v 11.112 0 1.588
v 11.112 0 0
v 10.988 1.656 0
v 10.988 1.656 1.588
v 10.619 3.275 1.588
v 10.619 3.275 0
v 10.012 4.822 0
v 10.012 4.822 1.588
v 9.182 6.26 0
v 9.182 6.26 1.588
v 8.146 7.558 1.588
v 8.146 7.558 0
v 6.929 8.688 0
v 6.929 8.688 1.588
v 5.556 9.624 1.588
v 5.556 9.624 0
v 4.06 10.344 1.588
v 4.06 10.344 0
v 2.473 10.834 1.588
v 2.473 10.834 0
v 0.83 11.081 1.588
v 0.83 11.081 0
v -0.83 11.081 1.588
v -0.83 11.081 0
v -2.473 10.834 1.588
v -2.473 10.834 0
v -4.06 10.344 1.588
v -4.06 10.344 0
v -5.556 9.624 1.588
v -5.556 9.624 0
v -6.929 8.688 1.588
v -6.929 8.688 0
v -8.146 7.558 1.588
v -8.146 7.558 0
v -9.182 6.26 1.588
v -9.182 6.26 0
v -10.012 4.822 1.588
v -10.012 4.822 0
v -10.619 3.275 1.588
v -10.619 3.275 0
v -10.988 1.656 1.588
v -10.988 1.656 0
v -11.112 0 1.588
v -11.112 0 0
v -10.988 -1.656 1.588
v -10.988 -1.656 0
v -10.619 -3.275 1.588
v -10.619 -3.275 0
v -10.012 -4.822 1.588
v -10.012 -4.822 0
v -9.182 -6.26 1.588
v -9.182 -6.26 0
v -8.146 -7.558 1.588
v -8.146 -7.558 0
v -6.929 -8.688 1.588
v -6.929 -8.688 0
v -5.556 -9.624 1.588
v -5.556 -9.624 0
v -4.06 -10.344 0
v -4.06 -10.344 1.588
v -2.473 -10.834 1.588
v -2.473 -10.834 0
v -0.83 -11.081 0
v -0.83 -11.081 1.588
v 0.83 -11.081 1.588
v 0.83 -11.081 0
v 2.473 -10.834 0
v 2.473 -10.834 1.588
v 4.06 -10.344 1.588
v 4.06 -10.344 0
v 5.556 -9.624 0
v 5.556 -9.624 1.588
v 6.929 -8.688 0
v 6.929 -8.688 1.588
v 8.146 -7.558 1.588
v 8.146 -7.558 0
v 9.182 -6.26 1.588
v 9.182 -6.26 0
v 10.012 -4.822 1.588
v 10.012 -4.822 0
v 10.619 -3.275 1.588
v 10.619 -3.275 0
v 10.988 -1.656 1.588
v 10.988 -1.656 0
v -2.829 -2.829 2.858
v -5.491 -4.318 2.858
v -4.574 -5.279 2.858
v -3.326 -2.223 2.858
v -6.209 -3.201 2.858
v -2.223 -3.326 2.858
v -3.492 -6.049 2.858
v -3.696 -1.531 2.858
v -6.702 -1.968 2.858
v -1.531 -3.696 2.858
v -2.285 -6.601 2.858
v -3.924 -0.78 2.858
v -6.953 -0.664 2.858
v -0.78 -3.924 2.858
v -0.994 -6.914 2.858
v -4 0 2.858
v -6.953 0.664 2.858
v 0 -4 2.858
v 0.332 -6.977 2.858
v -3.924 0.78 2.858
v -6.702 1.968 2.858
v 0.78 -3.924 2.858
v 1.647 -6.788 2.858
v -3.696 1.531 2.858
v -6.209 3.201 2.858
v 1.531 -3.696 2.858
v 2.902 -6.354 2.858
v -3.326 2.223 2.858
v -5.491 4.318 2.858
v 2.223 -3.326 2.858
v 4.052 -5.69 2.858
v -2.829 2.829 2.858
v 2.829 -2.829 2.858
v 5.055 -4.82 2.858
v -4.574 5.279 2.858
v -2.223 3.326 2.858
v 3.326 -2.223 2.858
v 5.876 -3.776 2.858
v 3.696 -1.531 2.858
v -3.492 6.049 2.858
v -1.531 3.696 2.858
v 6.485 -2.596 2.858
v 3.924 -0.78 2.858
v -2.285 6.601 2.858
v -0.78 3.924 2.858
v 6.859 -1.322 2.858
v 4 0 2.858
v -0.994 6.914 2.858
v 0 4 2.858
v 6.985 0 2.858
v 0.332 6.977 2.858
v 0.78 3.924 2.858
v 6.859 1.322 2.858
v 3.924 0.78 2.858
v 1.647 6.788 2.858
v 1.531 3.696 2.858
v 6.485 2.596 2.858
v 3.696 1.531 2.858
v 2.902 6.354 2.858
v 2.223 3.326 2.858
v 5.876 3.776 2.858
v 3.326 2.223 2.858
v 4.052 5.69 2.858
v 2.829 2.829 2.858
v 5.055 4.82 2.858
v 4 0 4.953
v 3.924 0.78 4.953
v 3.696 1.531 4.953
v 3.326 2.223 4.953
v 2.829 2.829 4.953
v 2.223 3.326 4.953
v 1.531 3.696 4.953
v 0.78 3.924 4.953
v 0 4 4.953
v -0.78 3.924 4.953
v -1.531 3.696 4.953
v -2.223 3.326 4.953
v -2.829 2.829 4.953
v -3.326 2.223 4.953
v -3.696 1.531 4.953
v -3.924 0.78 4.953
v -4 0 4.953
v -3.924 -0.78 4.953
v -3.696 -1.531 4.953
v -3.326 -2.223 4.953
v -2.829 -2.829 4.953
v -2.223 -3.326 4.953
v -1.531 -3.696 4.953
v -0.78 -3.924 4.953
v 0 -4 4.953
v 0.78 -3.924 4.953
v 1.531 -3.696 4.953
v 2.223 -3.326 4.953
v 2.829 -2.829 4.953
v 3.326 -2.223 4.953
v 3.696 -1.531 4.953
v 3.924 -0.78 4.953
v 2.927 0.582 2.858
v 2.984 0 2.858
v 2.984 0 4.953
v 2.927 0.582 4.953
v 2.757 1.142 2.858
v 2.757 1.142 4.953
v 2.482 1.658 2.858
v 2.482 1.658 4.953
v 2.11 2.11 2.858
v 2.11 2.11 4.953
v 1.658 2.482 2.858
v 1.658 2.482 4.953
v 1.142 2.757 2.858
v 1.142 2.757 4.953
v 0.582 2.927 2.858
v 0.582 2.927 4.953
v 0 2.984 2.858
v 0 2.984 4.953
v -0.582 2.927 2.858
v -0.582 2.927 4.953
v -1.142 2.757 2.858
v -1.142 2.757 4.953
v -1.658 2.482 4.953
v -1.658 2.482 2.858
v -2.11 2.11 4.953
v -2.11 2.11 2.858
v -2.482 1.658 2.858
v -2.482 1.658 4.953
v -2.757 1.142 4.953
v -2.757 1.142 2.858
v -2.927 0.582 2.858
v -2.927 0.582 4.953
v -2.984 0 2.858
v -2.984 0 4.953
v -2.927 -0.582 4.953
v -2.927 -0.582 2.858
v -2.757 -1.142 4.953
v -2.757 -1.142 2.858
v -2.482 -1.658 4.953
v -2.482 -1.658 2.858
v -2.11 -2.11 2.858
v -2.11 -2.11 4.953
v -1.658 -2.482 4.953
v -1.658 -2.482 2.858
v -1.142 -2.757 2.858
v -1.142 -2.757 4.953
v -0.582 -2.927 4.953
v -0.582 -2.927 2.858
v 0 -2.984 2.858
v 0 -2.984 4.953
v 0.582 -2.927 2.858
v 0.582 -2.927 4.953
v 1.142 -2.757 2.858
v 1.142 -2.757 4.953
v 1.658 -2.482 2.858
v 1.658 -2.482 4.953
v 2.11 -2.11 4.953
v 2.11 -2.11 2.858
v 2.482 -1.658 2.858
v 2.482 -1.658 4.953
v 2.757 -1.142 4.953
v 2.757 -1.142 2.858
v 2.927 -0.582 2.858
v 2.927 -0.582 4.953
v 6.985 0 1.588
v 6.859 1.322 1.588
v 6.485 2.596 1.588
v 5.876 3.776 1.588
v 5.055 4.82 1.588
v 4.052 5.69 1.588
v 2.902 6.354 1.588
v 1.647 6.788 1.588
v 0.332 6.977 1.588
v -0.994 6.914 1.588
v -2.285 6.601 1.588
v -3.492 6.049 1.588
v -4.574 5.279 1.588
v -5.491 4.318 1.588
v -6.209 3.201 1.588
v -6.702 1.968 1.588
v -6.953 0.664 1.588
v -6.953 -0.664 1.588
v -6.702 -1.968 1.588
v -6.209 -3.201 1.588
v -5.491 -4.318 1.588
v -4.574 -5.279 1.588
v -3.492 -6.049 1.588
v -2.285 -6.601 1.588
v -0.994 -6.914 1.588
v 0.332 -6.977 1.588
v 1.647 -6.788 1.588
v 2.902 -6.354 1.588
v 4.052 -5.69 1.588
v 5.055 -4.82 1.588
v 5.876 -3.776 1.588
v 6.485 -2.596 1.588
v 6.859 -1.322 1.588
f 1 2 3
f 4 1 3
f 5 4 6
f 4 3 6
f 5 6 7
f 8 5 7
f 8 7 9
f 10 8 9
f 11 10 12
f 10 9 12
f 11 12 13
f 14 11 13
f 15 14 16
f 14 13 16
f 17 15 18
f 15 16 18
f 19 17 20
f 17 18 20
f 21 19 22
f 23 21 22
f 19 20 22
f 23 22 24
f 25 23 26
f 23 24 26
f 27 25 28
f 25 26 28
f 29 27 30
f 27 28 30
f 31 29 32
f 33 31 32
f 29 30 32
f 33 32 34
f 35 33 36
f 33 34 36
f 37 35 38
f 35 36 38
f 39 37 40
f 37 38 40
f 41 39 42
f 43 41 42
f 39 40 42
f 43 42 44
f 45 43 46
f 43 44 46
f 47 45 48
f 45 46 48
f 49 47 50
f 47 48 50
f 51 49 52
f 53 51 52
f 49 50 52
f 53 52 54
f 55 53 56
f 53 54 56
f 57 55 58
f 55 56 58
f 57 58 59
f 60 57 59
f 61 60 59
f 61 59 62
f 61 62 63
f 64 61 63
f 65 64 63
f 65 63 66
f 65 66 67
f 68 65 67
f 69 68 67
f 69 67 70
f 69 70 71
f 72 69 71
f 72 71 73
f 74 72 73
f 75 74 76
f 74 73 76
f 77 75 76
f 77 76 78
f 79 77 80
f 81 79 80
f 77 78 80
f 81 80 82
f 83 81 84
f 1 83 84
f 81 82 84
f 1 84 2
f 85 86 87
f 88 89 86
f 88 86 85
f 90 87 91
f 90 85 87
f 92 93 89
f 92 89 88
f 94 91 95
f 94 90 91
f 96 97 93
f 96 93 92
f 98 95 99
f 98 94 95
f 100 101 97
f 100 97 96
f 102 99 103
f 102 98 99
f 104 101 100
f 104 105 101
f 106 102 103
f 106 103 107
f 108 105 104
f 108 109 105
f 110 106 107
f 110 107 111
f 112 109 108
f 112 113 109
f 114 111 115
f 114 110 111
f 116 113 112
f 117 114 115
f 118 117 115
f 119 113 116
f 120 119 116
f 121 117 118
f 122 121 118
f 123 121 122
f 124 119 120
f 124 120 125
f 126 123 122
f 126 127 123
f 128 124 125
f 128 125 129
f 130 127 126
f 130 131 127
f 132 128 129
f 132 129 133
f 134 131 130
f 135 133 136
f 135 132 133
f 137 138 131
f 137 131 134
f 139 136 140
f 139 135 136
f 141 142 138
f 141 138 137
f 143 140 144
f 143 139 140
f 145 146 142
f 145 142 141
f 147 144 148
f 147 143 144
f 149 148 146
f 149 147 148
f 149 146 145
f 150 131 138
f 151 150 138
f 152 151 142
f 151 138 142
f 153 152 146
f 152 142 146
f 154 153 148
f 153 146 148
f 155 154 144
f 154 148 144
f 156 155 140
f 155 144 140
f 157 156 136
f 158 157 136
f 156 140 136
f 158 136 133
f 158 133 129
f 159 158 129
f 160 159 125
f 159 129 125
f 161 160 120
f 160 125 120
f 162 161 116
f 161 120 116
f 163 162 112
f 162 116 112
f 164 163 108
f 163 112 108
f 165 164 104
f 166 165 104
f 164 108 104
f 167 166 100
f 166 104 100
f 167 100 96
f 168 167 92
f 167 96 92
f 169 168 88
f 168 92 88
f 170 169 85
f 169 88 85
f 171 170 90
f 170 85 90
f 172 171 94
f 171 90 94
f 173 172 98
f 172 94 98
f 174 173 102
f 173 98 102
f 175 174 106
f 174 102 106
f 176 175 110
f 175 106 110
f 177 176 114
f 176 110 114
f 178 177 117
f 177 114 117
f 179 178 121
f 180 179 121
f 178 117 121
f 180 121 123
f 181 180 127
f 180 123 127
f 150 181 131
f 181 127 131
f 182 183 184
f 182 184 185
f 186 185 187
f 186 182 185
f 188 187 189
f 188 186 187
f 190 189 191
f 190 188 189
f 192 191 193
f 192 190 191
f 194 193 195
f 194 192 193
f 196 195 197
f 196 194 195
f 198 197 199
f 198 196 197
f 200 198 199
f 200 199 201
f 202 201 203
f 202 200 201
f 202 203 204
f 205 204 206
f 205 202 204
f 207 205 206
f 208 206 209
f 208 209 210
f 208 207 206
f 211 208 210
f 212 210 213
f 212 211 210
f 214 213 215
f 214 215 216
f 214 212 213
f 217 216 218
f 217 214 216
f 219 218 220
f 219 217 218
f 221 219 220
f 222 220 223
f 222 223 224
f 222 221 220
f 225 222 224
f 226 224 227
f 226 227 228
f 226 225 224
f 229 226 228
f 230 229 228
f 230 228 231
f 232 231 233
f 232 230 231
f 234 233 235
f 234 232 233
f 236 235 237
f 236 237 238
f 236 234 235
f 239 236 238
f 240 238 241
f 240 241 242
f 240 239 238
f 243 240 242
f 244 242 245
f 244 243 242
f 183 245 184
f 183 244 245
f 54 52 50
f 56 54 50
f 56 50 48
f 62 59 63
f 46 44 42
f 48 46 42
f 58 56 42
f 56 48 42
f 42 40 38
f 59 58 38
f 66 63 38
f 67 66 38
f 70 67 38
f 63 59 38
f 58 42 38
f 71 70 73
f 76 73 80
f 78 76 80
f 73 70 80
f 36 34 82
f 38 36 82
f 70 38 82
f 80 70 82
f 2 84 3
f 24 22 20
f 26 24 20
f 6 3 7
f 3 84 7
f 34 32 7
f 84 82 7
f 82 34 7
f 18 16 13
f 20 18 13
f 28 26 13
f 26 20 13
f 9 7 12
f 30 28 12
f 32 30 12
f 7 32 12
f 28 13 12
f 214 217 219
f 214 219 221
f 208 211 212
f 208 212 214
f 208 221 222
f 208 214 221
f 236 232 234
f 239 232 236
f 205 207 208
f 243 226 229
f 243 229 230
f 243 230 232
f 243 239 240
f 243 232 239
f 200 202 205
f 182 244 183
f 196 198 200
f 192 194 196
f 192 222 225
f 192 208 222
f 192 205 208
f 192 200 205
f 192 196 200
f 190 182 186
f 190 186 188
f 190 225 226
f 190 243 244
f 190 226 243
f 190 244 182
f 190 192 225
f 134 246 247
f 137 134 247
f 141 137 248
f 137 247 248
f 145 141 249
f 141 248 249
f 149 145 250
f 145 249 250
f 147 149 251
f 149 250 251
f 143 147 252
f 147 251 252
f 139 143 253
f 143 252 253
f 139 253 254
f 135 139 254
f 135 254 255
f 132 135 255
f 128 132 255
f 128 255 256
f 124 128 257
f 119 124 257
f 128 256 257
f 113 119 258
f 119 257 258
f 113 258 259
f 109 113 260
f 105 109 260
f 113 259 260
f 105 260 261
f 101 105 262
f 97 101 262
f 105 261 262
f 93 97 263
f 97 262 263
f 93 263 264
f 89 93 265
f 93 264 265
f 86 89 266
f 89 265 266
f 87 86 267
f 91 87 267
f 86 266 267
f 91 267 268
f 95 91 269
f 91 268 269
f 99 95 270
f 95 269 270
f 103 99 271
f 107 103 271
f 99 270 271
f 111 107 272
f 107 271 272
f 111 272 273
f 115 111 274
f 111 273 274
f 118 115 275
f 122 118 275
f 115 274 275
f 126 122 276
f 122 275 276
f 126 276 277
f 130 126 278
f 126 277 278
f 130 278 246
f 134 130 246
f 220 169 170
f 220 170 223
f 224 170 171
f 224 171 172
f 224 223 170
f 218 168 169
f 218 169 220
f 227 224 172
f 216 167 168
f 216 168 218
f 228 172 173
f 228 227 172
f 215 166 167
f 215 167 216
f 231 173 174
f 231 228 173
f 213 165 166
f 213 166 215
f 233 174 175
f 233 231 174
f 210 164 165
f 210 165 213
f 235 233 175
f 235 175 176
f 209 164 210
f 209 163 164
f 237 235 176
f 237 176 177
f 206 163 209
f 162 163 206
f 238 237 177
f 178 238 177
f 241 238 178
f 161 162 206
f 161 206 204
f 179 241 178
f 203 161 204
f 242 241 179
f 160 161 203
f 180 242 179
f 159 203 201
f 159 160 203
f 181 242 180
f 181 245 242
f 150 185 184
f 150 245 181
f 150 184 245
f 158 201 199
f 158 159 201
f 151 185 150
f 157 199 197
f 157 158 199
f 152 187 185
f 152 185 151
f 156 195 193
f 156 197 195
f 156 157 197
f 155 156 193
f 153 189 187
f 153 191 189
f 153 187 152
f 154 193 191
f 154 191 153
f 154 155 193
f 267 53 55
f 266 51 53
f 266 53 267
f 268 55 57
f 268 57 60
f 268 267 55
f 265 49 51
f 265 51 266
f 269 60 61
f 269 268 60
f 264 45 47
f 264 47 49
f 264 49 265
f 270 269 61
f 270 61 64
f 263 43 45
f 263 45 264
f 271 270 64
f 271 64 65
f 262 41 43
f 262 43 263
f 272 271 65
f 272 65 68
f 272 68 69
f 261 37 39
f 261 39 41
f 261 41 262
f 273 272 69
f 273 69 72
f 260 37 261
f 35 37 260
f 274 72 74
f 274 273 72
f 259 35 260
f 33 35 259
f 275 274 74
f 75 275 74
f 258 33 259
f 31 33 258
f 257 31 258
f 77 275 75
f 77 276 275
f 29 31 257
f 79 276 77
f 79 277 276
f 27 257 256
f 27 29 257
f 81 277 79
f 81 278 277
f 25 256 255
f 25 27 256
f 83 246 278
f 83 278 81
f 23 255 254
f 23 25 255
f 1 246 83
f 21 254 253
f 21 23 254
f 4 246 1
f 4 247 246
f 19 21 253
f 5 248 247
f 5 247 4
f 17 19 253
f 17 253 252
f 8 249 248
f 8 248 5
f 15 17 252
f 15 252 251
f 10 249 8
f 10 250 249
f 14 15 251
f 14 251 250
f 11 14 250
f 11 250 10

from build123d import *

# Parameters (mm, degrees)
F0_R     = 11.1125
F1_DEPTH = 1.5875
F2_R     = 6.985
F3_DEPTH = 1.27
F4_R     = 4.0005
F4_R_2   = 2.9845
F5_DEPTH = 2.0955


with BuildPart() as f1:
    # F0 (on Top) → F1 (new body)
    with BuildSketch(Plane.XY):
        Circle(F0_R)
    extrude(amount=F1_DEPTH)

    # F2 (on face) → F3 (join)
    with BuildSketch(Plane.XY.offset(1.5875)):
        Circle(F2_R)
    extrude(amount=F3_DEPTH)

    # F4 (on face) → F5 (join)
    with BuildSketch(Plane.XY.offset(2.8575)):
        Circle(F4_R)
        Circle(F4_R_2, mode=Mode.SUBTRACT)
    extrude(amount=F5_DEPTH)


solid = f1.part
